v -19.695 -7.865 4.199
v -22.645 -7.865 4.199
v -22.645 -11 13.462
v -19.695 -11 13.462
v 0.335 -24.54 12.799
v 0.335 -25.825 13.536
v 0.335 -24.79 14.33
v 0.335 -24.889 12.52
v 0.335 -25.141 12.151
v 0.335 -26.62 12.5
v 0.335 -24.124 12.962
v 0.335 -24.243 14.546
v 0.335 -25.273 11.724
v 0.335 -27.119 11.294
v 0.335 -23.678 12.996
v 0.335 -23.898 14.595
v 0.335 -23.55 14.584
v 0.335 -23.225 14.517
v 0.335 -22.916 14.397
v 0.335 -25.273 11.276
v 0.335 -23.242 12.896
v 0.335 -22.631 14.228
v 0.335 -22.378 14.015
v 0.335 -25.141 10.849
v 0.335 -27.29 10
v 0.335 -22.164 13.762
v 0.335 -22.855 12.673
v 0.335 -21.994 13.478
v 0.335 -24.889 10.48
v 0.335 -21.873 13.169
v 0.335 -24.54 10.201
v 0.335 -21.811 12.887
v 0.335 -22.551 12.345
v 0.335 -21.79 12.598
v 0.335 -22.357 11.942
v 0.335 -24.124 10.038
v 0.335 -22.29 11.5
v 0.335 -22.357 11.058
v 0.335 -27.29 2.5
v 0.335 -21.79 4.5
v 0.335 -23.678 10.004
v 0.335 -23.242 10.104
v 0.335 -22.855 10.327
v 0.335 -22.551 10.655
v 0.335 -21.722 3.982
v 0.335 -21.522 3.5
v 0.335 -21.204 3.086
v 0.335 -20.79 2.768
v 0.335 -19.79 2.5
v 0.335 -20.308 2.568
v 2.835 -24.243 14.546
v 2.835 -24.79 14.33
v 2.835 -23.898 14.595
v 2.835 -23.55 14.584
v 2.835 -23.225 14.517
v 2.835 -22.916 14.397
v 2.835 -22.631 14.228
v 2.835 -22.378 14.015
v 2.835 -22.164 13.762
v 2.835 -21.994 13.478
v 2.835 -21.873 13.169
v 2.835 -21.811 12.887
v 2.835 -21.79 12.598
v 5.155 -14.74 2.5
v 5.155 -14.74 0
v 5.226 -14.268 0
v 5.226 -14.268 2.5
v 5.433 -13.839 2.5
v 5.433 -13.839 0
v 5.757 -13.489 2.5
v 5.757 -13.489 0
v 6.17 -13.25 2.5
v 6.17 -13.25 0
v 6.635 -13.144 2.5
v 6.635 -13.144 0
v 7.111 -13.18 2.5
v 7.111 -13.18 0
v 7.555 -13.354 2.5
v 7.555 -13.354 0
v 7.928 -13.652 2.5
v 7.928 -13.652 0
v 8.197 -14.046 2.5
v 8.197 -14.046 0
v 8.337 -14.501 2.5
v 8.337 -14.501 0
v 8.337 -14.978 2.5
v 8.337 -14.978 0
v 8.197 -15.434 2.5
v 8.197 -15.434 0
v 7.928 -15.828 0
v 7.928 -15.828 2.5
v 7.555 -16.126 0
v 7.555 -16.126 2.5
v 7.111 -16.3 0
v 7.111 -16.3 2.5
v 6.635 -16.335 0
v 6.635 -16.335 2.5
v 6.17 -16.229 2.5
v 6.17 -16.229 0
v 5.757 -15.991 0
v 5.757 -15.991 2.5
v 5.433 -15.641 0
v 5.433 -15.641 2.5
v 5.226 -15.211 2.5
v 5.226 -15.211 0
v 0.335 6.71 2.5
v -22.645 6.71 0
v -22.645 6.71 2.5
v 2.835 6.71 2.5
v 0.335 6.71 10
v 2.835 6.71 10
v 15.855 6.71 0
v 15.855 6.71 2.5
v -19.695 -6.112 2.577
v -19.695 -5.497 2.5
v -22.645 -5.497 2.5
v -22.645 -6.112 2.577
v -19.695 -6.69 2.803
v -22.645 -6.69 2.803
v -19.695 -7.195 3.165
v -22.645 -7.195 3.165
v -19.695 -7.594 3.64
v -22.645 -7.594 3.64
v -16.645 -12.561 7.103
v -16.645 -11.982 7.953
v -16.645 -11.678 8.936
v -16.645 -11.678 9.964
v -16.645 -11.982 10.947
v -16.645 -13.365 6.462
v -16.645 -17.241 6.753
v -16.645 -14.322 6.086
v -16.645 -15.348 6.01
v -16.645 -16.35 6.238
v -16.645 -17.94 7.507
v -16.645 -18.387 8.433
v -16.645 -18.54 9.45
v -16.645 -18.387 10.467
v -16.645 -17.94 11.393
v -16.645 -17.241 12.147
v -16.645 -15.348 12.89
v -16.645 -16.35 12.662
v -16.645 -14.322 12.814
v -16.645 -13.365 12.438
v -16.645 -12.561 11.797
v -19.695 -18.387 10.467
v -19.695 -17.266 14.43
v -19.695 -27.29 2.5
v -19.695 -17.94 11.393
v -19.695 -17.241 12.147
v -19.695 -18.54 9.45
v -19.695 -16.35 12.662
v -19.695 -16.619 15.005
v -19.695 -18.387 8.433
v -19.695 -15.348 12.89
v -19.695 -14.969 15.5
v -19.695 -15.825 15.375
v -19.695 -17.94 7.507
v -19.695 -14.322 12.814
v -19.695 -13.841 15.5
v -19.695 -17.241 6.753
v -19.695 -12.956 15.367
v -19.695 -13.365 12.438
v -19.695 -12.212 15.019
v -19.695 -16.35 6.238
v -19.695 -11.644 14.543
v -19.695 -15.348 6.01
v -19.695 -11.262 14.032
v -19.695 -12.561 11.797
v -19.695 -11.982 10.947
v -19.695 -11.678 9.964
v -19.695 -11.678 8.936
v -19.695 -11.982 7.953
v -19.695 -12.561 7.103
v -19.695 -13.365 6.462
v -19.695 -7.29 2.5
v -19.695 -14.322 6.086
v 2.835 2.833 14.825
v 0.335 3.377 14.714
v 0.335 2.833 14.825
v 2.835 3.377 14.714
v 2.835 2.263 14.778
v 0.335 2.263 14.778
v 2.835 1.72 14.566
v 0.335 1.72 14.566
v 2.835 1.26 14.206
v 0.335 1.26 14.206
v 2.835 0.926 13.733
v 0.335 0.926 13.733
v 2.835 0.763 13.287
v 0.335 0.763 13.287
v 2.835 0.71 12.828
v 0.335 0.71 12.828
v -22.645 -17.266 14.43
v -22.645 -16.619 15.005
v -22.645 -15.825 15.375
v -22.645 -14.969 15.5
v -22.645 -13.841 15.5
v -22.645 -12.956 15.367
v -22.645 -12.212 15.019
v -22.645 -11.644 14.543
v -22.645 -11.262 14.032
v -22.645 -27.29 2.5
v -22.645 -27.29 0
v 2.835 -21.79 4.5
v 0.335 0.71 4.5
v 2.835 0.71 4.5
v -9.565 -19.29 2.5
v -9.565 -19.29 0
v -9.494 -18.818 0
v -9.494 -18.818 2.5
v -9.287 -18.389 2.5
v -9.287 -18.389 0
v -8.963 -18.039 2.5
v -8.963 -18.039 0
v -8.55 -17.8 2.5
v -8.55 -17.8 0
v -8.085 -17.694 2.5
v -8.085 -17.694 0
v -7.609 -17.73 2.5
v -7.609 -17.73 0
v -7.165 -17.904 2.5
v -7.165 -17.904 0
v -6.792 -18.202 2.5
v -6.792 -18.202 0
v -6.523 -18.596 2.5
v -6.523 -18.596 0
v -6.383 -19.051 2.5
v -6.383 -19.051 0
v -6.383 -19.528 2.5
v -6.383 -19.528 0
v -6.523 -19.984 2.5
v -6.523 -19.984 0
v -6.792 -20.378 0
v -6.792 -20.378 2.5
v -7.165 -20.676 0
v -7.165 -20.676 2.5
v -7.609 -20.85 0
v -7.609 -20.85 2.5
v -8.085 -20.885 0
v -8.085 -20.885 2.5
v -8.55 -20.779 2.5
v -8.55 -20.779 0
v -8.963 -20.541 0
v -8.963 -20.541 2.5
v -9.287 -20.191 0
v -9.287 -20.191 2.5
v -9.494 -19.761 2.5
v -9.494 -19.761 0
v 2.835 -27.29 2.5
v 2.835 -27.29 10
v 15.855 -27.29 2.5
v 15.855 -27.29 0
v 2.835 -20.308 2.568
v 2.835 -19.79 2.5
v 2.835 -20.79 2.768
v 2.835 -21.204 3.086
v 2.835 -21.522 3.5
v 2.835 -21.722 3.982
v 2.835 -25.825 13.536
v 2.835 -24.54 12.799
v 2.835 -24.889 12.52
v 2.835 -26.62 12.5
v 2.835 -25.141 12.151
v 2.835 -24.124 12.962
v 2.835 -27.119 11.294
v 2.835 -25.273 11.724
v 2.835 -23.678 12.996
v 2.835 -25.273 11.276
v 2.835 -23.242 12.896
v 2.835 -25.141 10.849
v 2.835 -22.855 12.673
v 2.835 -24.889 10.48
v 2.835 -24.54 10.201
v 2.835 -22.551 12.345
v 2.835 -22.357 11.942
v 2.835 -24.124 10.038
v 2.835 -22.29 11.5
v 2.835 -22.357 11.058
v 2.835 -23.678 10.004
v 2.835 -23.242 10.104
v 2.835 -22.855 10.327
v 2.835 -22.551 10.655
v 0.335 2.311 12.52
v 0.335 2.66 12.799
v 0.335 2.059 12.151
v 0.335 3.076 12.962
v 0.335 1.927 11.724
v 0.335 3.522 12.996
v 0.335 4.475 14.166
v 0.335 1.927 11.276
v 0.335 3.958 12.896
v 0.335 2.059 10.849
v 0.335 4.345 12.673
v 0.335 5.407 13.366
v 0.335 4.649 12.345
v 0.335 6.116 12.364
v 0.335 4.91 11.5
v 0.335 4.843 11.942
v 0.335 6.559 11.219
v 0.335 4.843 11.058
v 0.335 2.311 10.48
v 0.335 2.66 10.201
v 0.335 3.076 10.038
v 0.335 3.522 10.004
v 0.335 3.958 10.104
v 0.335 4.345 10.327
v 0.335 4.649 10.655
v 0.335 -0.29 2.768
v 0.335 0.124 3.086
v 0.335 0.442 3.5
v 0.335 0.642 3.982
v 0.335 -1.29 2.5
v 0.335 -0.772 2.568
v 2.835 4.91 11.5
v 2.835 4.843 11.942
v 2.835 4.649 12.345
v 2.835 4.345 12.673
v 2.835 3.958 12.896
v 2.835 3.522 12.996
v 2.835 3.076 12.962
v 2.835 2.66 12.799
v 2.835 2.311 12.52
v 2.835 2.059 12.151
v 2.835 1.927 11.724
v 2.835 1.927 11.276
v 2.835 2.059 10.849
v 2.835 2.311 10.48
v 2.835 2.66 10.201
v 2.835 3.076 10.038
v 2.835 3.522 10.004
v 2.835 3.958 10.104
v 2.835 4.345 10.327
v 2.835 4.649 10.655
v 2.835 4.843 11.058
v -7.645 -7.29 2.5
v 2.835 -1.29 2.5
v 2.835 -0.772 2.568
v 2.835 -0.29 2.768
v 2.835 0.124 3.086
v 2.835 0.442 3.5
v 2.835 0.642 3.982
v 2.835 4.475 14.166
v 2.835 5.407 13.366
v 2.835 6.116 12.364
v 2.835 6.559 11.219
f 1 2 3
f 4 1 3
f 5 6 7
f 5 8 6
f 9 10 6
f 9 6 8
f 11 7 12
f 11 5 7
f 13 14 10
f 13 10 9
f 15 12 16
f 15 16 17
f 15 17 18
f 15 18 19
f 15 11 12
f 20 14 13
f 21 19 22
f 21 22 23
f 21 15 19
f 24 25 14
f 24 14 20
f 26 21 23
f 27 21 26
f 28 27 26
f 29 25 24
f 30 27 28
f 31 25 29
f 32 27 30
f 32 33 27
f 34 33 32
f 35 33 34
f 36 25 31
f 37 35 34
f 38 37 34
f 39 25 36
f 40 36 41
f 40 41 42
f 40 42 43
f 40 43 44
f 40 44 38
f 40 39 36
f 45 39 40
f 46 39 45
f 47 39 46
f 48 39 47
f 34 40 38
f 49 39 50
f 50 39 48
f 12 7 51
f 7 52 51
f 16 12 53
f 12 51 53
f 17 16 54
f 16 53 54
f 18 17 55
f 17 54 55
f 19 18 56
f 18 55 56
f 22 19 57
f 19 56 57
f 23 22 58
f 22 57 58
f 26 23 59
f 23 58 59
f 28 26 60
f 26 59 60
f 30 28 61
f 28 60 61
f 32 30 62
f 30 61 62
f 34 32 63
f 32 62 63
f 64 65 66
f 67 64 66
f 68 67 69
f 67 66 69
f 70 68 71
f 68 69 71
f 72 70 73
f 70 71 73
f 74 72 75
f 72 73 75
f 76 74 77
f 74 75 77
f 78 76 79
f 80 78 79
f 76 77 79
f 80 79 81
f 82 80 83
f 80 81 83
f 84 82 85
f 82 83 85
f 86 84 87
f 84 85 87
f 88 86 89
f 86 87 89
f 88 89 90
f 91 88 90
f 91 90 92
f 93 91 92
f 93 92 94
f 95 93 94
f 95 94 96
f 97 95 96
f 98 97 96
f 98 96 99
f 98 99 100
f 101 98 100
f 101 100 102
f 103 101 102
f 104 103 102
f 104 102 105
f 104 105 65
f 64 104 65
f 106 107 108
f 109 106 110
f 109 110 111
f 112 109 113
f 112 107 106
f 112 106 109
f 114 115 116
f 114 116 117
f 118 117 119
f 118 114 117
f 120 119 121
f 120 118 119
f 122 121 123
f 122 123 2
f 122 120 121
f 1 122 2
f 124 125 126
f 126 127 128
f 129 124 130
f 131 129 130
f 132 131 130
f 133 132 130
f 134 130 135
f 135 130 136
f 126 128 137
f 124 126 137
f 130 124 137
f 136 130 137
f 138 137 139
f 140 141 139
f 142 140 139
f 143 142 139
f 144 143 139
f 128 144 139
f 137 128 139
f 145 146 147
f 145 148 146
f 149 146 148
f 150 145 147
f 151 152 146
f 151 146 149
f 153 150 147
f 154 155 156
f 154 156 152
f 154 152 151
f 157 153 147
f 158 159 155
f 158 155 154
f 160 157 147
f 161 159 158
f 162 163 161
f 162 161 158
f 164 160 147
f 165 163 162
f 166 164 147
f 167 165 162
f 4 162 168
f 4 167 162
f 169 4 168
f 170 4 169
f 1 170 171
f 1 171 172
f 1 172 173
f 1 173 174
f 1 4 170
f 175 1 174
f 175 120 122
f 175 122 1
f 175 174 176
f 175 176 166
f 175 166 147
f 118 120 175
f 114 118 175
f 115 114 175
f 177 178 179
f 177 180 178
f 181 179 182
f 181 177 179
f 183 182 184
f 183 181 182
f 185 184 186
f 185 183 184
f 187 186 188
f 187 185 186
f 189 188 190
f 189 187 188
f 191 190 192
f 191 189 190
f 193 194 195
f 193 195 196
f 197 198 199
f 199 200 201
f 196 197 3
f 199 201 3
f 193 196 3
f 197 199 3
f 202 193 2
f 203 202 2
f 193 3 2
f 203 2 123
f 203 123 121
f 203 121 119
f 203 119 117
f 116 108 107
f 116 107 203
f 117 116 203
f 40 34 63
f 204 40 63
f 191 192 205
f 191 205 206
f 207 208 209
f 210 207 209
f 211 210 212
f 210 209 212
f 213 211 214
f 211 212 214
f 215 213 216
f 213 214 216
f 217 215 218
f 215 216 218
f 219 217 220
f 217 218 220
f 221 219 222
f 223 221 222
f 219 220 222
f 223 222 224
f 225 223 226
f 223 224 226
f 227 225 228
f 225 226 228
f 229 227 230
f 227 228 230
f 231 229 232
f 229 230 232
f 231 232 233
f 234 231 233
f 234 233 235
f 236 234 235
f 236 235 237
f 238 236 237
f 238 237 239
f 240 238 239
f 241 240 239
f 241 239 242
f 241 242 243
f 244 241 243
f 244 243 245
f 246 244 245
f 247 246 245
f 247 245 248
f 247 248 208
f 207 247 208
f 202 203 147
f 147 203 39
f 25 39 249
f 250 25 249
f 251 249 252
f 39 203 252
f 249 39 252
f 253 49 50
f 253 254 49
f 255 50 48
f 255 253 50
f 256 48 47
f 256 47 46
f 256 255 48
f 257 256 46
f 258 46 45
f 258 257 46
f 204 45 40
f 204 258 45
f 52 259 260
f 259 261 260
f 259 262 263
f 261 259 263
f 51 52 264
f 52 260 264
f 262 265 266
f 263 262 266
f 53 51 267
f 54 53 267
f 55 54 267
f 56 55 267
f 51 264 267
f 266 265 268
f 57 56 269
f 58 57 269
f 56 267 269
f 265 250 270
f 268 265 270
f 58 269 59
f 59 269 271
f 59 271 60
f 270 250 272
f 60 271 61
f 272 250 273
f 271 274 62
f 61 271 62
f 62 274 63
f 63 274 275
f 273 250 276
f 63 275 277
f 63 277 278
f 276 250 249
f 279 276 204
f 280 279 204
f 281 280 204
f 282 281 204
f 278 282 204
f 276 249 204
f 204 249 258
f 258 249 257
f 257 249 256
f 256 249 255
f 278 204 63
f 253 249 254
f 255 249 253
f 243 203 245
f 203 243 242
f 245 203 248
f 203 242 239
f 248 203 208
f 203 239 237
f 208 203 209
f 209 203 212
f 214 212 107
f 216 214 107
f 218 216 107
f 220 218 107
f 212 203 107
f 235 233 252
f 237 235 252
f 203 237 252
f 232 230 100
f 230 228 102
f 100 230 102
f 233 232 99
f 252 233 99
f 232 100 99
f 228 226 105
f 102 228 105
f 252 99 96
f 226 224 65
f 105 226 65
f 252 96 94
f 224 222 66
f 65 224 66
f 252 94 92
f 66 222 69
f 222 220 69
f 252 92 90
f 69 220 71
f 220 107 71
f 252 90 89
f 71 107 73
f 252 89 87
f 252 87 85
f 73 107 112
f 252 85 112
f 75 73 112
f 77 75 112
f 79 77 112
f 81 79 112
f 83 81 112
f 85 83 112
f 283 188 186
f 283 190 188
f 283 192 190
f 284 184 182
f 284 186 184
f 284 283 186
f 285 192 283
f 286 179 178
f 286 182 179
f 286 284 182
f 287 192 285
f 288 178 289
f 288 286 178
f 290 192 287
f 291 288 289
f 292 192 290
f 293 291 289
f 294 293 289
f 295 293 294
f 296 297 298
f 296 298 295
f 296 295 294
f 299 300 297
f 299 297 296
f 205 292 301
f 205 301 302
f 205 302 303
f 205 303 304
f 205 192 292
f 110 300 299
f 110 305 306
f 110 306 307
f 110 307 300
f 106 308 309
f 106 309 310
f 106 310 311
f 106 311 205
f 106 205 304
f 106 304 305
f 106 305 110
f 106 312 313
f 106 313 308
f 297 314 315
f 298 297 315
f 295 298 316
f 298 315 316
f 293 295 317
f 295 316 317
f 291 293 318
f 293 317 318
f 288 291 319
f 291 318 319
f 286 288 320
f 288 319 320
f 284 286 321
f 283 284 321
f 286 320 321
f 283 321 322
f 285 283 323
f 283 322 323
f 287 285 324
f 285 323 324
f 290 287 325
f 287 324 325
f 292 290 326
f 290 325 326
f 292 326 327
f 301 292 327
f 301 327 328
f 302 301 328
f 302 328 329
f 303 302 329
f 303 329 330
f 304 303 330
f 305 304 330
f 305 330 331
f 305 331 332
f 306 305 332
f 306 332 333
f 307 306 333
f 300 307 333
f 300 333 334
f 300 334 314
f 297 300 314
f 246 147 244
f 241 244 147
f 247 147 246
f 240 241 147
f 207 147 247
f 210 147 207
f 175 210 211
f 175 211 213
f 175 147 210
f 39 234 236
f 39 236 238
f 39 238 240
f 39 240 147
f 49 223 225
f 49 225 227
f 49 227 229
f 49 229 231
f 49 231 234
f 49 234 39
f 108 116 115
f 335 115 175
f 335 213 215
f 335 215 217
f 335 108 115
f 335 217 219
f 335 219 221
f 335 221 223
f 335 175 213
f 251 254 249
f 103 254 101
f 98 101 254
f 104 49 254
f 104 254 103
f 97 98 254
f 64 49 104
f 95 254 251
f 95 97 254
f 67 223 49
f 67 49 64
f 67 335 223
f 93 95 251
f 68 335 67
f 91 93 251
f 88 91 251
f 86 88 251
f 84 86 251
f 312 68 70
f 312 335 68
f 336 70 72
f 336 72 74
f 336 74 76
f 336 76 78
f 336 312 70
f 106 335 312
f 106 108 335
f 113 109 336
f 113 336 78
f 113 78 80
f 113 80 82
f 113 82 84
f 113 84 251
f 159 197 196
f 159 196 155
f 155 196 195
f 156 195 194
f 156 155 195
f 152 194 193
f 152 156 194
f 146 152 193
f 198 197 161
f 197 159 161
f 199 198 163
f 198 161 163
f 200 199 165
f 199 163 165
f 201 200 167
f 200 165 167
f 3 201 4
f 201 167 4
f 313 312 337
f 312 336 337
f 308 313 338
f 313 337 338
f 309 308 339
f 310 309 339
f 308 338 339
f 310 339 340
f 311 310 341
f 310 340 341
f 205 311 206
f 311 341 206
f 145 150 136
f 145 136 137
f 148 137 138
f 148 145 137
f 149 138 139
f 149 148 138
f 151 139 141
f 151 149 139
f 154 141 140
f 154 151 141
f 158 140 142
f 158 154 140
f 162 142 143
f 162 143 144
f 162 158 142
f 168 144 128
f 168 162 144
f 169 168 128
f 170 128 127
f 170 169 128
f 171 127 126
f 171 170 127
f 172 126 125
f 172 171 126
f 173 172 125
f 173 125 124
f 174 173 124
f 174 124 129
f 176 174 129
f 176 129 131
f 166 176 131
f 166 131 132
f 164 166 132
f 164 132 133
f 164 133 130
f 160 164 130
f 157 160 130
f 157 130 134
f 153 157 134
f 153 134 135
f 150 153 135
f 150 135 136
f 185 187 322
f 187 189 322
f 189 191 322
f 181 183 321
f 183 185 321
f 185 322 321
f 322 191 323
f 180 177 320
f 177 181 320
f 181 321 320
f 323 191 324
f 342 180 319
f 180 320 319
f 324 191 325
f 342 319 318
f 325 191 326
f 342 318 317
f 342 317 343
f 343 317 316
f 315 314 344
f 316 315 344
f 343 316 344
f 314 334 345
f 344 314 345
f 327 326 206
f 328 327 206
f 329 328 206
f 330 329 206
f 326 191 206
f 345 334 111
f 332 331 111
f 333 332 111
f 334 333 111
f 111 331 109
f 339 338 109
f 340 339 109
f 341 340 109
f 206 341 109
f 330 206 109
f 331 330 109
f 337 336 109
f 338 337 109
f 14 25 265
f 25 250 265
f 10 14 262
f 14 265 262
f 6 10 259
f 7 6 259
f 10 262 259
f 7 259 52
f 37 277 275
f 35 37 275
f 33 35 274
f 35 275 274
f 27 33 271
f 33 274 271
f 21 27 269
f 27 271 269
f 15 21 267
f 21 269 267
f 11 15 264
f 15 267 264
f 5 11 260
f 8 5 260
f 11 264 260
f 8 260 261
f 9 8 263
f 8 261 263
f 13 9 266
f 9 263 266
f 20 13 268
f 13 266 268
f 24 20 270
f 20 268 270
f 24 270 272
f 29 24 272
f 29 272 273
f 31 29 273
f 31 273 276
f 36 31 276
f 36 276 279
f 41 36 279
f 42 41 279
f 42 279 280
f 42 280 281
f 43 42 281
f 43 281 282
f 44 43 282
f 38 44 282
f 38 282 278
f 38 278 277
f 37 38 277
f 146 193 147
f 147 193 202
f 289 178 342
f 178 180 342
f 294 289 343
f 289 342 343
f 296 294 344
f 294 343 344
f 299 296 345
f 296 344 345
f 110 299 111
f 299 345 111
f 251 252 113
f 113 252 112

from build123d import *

# Parameters (mm, degrees)
ESBO_O1_W                = 38.5
ESBO_O1_H                = 34
RESSALTO_EXTRUS_O1_DEPTH = 2.5
ESBO_O2_W                = 2.5
ESBO_O2_H                = 6
ESBO_O2_H_2              = 5.5
RESSALTO_EXTRUS_O2_DEPTH = 12.5
CORTE_EXTRUS_O1_REACH    = 42.236
ESBO_O3_R                = 1.5
ESBO_O4_W                = 2.95
ESBO_O4_H                = 20
RESSALTO_EXTRUS_O3_DEPTH = 13
ESBO_O5_R                = 3.45
CORTE_EXTRUS_O2_DEPTH    = 15
FILETE1_R                = 3
FILETE2_R                = 2.5
ESBO_O7_R                = 3.45
RESSALTO_EXTRUS_O5_DEPTH = 6
ESBO_O8_R                = 1.6
CORTE_EXTRUS_O3_DEPTH    = 6
FILETE3_R                = 2
FILETE4_R                = 5
FILETE5_R                = 2


with BuildPart() as part:
    # Esboço1 → Ressalto-extrusão1 (new body)
    with BuildSketch(Plane.XY):
        with Locations((-3.395014232, -10.289862205)):
            Rectangle(ESBO_O1_W, ESBO_O1_H)
    extrude(amount=RESSALTO_EXTRUS_O1_DEPTH)

    # Esboço2 → Ressalto-extrusão2 (add)
    with BuildSketch(Plane.XY.offset(2.5)):
        with Locations((1.584985768, 3.710137795)):
            Rectangle(ESBO_O2_W, ESBO_O2_H)
        with Locations((1.584985768, -24.539862205)):
            Rectangle(ESBO_O2_W, ESBO_O2_H_2)
    extrude(amount=RESSALTO_EXTRUS_O2_DEPTH)

    # Esboço3 → Corte-extrusão1 (cut, up to next)
    with BuildSketch(Plane(origin=(2.834985768, 0, 0), x_dir=(0, 0, -1), z_dir=(1, 0, 0)), mode=Mode.PRIVATE) as corte_extrus_o1_sk1:
        with Locations(Location((-11.5, 3.410137795, 0), (0, 0, 90))):
            Circle(ESBO_O3_R)
    corte_extrus_o1_tool1 = extrude(corte_extrus_o1_sk1.sketch, amount=-CORTE_EXTRUS_O1_REACH, mode=Mode.PRIVATE) & part.part
    # Esboço3 → Corte-extrusão1 (cut, up to next)
    with BuildSketch(Plane(origin=(2.834985768, 0, 0), x_dir=(0, 0, -1), z_dir=(1, 0, 0)), mode=Mode.PRIVATE) as corte_extrus_o1_sk2:
        with Locations(Location((-11.5, -23.789862205, 0), (0, 0, 90))):
            Circle(ESBO_O3_R)
    corte_extrus_o1_tool2 = extrude(corte_extrus_o1_sk2.sketch, amount=-CORTE_EXTRUS_O1_REACH, mode=Mode.PRIVATE) & part.part
    add(corte_extrus_o1_tool1.solids().sort_by_distance((2.834986, 3.410138, 11.5))[0], mode=Mode.SUBTRACT)
    add(corte_extrus_o1_tool2.solids().sort_by_distance((2.834986, -23.789862, 11.5))[0], mode=Mode.SUBTRACT)

    # Esboço4 → Ressalto-extrusão3 (add)
    with BuildSketch(Plane.XY.offset(2.5)):
        with Locations((-21.170014232, -17.289862205)):
            Rectangle(ESBO_O4_W, ESBO_O4_H)
    extrude(amount=RESSALTO_EXTRUS_O3_DEPTH)

    # Esboço5 → Corte-extrusão2 (cut)
    with BuildSketch(Plane.ZY.offset(22.645014232)):
        Polygon((2.5, -7.289862205), (15.222036194, -11.595443281), (15.5, -11.689515935), (15.5, -7.289862205), align=None)
        Polygon((15.222036194, -16.59994967), (2.5, -27.289862205), (15.5, -27.289862205), (15.5, -16.36638574), align=None)
        with Locations(Location((9.45, -15.089862205, 0), (0, 0, 270))):
            Circle(ESBO_O5_R)
    extrude(amount=-CORTE_EXTRUS_O2_DEPTH, mode=Mode.SUBTRACT)

    # Filete1
    filete1_edges = [part.edges().sort_by_distance(p)[0] for p in [
        (-21.170014232, -11.689515935, 15.5),
        (-21.170014232, -16.36638574, 15.5),
    ]]
    fillet(filete1_edges, radius=FILETE1_R)

    # Filete2
    # the kernel refuses this fillet: 2.5 mm, written as the material it adds along each edge
    with BuildSketch(Plane(origin=(-19.695014232, -7.289862205, 2.5), x_dir=(0, -0.32057353707536407, 0.947223631106715), z_dir=(-1, 0, 0))) as filete2_piece_1:
        with BuildLine():
            CenterArc((FILETE2_R * 0.717282002488, FILETE2_R), FILETE2_R, 198.697613514, 71.302386486)
            Line((-FILETE2_R * 0.229941628618, FILETE2_R * 0.679426462925), (0, 0))
            Line((0, 0), (FILETE2_R * 0.717282002488, 0))
        make_face()
    extrude(amount=2.95)

    # Esboço7 → Ressalto-extrusão5 (add)
    with BuildSketch(Plane.ZY.offset(22.645014232)):
        with Locations(Location((9.45, -15.089862205, 0), (0, 0, 270))):
            Circle(ESBO_O7_R)
    extrude(amount=-RESSALTO_EXTRUS_O5_DEPTH)

    # Esboço8 → Corte-extrusão3 (cut)
    with BuildSketch(Plane(origin=(0, 0, 0), x_dir=(-1, 0, 0), z_dir=(0, 0, -1))):
        with Locations((7.965014232, -19.289862205)):
            Circle(ESBO_O8_R)
        with Locations((-6.754985768, -14.739862205)):
            Circle(ESBO_O8_R)
    extrude(amount=-CORTE_EXTRUS_O3_DEPTH, mode=Mode.SUBTRACT)

    # Filete3
    filete3_edges = [part.edges().sort_by_distance(p)[0] for p in [
        (1.584985768, -21.789862205, 2.5),
        (1.584985768, 0.710137795, 2.5),
    ]]
    fillet(filete3_edges, radius=FILETE3_R)

    # Filete4
    filete4_edges = [part.edges().sort_by_distance(p)[0] for p in [
        (1.584985768, -27.289862205, 15),
        (1.584985768, 6.710137795, 15),
    ]]
    fillet(filete4_edges, radius=FILETE4_R)

    # Filete5
    filete5_edges = [part.edges().sort_by_distance(p)[0] for p in [
        (1.584985768, 0.710137795, 15),
        (1.584985768, -21.789862205, 15),
    ]]
    fillet(filete5_edges, radius=FILETE5_R)


solid = part.part
